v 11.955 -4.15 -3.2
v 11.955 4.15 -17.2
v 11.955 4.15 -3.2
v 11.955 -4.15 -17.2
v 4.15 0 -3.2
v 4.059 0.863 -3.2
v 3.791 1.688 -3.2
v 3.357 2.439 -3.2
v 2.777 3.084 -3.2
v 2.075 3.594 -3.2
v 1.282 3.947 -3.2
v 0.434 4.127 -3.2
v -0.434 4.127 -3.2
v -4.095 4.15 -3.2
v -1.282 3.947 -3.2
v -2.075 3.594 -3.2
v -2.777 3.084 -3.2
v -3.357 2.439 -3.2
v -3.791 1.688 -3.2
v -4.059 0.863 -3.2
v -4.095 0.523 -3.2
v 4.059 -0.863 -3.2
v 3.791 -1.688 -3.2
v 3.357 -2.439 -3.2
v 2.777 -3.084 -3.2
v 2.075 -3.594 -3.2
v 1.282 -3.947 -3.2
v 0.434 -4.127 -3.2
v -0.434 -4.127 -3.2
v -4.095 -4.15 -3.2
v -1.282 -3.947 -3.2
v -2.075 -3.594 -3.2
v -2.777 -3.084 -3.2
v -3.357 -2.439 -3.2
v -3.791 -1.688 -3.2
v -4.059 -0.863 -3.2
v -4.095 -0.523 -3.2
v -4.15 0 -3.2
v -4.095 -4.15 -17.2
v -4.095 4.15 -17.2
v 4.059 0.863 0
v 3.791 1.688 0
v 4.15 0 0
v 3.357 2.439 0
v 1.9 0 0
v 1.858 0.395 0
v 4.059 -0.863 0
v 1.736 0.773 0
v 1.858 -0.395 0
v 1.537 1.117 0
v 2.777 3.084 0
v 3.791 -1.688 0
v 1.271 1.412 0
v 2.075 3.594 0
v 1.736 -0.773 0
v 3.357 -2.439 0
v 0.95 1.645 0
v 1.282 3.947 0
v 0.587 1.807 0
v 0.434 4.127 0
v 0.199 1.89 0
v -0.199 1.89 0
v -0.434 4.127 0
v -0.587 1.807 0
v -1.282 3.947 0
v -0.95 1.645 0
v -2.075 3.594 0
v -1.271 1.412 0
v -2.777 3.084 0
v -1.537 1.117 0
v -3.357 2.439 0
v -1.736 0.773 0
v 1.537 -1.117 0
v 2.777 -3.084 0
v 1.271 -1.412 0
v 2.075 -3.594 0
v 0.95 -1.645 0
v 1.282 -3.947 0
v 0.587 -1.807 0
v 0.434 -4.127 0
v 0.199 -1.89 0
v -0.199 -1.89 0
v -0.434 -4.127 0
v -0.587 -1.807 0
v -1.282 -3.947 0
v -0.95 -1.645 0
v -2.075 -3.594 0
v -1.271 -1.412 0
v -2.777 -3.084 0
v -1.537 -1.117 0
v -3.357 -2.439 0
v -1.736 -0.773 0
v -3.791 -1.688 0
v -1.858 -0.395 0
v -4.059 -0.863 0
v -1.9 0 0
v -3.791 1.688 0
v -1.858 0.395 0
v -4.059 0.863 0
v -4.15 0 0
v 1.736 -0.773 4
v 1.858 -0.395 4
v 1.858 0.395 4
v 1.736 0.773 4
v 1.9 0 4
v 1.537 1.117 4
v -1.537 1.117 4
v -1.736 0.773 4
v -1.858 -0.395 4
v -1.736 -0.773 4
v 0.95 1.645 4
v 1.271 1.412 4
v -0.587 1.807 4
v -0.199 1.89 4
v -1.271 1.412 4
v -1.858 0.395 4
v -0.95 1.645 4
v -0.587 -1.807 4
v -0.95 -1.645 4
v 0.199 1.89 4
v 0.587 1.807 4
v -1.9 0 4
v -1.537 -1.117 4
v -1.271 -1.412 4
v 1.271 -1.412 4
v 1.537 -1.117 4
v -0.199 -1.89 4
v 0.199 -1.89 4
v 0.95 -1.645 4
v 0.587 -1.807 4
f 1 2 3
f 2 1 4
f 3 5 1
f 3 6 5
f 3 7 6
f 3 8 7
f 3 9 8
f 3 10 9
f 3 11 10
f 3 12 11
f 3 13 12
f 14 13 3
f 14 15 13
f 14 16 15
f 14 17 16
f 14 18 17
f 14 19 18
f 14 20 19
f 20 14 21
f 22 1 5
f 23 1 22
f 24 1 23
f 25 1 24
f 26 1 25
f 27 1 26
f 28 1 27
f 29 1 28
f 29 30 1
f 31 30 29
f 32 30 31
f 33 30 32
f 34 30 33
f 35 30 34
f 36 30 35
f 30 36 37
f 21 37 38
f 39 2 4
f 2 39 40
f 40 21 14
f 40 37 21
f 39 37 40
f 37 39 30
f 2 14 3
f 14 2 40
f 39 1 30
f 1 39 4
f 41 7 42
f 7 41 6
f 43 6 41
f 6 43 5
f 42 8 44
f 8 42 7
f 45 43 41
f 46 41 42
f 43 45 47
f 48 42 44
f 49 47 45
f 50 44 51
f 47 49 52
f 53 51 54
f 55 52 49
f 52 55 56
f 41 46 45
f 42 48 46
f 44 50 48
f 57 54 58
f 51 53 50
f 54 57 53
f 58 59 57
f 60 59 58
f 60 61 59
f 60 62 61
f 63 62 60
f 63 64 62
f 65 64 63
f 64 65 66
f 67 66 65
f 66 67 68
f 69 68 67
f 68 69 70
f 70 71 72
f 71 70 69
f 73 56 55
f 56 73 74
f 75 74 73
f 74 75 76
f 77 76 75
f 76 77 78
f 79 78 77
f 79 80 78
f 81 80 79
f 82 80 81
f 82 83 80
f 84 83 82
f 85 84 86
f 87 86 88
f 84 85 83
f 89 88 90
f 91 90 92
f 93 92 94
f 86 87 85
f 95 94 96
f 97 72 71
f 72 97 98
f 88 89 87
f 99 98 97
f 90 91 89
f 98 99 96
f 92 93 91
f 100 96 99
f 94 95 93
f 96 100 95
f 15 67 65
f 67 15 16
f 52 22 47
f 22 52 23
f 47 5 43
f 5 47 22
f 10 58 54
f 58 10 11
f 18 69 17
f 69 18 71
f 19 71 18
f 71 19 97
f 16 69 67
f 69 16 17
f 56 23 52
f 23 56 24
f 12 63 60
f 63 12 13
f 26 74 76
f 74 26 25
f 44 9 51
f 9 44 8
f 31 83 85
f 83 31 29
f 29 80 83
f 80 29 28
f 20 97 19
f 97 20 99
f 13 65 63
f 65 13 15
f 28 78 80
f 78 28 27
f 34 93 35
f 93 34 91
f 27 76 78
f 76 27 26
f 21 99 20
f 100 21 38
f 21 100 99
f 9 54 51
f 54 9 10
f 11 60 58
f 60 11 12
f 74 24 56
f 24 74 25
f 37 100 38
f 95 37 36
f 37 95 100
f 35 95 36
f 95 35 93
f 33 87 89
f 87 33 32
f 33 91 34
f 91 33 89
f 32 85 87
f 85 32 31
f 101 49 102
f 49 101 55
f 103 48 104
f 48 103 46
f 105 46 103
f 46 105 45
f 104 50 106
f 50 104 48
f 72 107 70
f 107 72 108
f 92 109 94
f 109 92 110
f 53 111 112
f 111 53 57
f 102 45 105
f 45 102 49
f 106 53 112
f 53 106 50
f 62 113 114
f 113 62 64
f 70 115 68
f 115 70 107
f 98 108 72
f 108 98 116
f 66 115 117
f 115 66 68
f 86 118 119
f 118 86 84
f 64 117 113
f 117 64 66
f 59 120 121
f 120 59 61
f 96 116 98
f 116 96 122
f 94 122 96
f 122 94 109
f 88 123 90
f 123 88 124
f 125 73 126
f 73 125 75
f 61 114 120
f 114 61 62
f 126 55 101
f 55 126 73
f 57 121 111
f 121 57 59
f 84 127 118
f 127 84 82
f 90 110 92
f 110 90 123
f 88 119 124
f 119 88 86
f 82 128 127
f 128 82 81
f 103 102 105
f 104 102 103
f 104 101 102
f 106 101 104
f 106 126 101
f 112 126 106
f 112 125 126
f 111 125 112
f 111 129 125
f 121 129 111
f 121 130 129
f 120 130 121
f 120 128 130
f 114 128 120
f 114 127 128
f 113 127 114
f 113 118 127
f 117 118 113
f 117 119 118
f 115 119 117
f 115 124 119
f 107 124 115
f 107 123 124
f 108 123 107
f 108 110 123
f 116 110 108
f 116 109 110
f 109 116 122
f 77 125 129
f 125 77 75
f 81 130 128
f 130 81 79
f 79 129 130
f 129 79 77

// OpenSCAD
$fn=30;

microServo();
module microServo(center=true){
  //2gramm servo
  //e.g. DS-M005B
  //https://www.dspowerservo.com/ds-m005b-0-5kg-high-precision-copper-gear-coreless-2g-micro-servo-product/
  
  bdyDims=[16.05,8.3,17.2];
  chamfer=1; //chamfer on the body
  flngHght=10.2; //height of the flange
  flngDrill=1.8; //drill diameter
  flngDrillDist=19.5;
  flngWdth=23.3; //overall width of the flange
  oShaftDia=3.8;
  oShaftLngth=4;
  oShaftOffset= flngDrillDist/2-5.82; //offset between body center and shaft
  grBxHght=3.2; //height of the gearbox
  
  cntrOffset=center ? [0,0,-bdyDims.z] : [0,0,0];
  
  translate(cntrOffset){
    //body
    translate([oShaftOffset,0,(bdyDims.z-grBxHght)/2]) cube([bdyDims.x,bdyDims.y,bdyDims.z-grBxHght],true);
    translate([0,0,(bdyDims.z-grBxHght)]) cylinder(d=bdyDims.y,h=grBxHght);
    //shaft
    translate([0,0,bdyDims.z]) cylinder(d=oShaftDia,h=oShaftLngth);
    
    //flange
  }
  
  
}
